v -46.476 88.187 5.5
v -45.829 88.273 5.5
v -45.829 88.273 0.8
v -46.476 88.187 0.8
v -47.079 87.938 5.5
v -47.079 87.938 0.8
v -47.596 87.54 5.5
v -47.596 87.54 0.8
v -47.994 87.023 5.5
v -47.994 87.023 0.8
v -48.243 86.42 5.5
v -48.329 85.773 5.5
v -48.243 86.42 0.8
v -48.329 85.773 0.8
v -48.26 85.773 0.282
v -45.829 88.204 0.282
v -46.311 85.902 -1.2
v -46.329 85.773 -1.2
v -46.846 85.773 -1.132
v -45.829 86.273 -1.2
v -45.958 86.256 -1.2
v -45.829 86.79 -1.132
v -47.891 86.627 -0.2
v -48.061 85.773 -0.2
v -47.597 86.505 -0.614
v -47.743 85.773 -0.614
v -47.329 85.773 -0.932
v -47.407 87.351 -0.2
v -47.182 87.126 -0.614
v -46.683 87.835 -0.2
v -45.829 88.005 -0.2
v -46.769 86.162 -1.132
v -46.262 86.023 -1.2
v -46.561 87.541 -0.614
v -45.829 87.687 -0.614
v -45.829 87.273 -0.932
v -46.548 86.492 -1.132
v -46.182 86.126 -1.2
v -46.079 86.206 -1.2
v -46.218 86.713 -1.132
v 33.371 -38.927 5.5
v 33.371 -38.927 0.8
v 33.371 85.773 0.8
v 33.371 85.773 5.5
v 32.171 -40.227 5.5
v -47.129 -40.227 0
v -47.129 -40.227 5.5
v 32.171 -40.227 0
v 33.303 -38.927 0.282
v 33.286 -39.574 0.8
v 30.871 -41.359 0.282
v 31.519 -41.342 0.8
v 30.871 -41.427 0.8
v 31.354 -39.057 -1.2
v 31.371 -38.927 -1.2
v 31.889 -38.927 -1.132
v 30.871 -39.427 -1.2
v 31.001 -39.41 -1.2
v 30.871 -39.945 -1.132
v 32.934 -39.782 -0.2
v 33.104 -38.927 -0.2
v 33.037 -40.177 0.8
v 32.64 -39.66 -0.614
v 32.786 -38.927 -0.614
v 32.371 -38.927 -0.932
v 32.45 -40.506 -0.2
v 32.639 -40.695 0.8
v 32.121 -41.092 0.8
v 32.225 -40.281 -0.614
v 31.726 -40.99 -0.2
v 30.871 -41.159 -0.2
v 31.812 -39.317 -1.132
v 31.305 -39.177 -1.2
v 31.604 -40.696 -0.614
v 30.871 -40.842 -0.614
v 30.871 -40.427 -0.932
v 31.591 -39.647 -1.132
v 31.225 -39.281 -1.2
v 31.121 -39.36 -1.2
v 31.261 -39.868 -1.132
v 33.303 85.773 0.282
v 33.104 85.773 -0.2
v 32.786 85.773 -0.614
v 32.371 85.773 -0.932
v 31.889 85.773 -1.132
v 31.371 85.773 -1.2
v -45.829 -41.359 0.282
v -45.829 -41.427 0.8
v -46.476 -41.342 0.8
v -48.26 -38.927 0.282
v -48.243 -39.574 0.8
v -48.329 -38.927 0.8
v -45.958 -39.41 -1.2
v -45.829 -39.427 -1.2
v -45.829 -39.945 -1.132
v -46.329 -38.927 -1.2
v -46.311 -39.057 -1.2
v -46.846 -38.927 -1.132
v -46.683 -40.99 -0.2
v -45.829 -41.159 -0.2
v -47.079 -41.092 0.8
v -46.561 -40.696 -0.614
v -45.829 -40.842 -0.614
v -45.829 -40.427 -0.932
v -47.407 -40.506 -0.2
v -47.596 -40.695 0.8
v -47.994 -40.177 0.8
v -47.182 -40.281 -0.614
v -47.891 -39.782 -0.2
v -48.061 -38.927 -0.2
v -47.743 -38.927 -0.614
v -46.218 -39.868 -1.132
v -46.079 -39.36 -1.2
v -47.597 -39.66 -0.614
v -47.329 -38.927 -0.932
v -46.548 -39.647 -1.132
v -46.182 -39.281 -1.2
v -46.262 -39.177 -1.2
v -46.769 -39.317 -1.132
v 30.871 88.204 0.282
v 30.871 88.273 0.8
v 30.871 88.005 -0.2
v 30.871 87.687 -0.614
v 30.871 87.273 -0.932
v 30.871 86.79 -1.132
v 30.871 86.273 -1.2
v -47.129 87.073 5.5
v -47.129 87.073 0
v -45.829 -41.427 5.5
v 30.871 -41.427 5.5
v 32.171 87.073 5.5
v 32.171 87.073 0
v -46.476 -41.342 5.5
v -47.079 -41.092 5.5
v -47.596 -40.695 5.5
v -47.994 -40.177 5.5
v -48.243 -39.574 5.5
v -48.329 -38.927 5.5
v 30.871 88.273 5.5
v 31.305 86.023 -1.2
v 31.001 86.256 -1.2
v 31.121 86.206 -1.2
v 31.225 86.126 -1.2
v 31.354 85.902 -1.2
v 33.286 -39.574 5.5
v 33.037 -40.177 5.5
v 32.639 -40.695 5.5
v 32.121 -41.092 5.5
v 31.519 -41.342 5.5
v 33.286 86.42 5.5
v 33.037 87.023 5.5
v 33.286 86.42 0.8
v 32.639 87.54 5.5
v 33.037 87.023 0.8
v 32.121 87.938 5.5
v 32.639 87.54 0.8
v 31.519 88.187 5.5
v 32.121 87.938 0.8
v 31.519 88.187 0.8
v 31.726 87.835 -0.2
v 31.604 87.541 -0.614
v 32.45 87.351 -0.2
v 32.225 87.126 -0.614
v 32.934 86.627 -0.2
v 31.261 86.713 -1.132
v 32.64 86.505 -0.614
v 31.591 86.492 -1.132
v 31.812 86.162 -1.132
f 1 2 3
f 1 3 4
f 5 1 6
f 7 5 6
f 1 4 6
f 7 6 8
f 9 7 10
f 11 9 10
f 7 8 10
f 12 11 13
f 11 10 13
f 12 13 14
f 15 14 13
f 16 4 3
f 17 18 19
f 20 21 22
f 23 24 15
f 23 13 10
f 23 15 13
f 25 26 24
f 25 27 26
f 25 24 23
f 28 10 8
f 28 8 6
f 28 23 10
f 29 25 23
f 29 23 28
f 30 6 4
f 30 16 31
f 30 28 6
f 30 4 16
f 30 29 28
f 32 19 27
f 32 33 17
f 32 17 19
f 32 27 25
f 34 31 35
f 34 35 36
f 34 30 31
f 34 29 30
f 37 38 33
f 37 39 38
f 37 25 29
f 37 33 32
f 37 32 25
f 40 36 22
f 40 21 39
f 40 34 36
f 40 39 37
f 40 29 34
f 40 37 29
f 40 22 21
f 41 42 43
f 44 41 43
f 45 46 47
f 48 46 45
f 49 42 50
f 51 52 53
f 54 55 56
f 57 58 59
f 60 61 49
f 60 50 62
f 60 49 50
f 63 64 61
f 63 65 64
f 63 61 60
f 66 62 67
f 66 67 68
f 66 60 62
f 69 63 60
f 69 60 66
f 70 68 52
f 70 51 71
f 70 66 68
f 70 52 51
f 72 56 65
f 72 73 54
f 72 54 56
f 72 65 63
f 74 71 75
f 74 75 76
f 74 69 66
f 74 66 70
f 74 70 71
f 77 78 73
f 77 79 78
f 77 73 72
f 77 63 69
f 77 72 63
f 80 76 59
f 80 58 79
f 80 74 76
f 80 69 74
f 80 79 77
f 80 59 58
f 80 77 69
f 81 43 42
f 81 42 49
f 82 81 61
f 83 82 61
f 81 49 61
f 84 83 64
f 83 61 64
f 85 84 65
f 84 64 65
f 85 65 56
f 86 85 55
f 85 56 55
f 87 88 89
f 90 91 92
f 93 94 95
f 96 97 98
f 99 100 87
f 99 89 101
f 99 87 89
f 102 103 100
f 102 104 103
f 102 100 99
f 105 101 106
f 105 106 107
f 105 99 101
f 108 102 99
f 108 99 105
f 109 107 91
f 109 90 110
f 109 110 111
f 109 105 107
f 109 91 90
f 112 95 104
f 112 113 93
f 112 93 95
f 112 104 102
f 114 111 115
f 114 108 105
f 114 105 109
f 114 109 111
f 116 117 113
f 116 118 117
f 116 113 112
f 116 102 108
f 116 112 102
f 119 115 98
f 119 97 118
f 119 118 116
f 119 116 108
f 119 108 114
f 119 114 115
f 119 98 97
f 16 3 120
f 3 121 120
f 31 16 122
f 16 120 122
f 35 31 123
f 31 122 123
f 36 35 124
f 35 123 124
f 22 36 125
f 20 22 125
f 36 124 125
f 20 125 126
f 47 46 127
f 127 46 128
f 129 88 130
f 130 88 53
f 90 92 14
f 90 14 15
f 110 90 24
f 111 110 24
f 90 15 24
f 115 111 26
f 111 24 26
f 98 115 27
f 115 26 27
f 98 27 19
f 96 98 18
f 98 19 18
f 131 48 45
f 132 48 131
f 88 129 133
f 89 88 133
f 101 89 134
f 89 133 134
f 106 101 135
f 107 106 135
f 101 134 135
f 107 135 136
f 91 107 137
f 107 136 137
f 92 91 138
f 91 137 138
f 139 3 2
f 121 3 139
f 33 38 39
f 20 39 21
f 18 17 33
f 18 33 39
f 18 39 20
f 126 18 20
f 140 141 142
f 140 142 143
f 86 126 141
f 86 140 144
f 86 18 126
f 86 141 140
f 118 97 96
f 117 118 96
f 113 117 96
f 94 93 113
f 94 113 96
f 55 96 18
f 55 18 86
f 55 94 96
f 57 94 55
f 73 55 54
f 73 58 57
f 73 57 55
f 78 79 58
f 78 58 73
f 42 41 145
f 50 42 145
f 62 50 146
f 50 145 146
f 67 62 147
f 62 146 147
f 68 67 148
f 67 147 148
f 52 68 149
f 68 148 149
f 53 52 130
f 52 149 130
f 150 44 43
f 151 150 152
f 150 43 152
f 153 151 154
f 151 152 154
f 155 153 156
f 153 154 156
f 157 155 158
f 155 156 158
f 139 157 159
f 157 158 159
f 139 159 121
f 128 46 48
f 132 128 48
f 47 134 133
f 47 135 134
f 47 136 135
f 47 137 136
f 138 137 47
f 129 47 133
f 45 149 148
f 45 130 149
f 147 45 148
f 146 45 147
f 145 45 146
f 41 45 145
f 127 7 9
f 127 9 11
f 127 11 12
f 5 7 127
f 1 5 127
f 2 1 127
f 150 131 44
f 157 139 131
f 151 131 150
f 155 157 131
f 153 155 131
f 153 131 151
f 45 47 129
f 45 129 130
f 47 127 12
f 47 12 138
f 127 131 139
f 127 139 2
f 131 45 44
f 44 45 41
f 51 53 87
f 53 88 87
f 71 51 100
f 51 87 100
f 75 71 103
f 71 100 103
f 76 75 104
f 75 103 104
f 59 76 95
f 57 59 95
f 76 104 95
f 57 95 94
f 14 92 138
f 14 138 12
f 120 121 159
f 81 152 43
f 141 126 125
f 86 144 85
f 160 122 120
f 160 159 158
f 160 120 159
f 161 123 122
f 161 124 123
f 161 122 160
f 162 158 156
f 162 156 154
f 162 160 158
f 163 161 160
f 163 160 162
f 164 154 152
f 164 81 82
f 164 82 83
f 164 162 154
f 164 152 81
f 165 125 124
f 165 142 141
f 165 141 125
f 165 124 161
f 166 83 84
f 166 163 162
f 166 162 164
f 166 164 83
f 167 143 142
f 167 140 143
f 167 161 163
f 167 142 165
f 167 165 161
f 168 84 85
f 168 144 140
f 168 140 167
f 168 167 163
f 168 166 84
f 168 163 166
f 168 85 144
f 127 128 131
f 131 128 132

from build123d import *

# Parameters (mm, degrees)
F0_W        = 81.7
F0_H        = 129.7
F0_W_2      = 79.3
F0_H_2      = 127.3
F1_DEPTH    = 5.5
F1_FACE_W   = 81.7
F1_FACE_H   = 129.7
F1_FACE_W_2 = 79.3
F1_FACE_H_2 = 127.3
F2_DEPTH    = 1.2
F3_R        = 2.5
F4_R        = 2


with BuildPart() as f1:
    # F0 (on Top) → F1 (new body)
    with BuildSketch(Plane.XY):
        with Locations((-7.4785080035, 23.4226425927)):
            Rectangle(F0_W, F0_H)
        with Locations((-7.4785080035, 23.4226425927)):
            Rectangle(F0_W_2, F0_H_2, mode=Mode.SUBTRACT)
    extrude(amount=F1_DEPTH)

    # F0 (on Top) + F1_face (on face) → F2 (join)
    with BuildSketch(Plane.XY):
        with Locations((-7.4785080035, 23.4226425927)):
            Rectangle(F0_W_2, F0_H_2)
    with BuildSketch(Plane(origin=(-7.4785080035, 23.4226425927, 0), x_dir=(1, 0, 0), z_dir=(0, 0, -1))):
        Rectangle(F1_FACE_W, F1_FACE_H)
        Rectangle(F1_FACE_W_2, F1_FACE_H_2, mode=Mode.SUBTRACT)
    extrude(amount=-F2_DEPTH, dir=(0, 0, 1))

    # F3
    f3_edges = [f1.edges().sort_by_distance(p)[0] for p in [
        (-48.328508, 88.272643, 2.15),
        (-48.328508, -41.427357, 2.15),
        (33.371492, -41.427357, 2.15),
        (33.371492, 88.272643, 2.15),
    ]]
    fillet(f3_edges, radius=F3_R)

    # F4
    f4_edges = [f1.edges().sort_by_distance(p)[0] for p in [
        (-7.478508, 88.272643, -1.2),
        (-47.596275, 87.54041, -1.2),
        (32.639259, 87.54041, -1.2),
        (-48.328508, 23.422643, -1.2),
        (33.371492, 23.422643, -1.2),
        (-47.596275, -40.695124, -1.2),
        (32.639259, -40.695124, -1.2),
        (-7.478508, -41.427357, -1.2),
    ]]
    fillet(f4_edges, radius=F4_R)


solid = f1.part
